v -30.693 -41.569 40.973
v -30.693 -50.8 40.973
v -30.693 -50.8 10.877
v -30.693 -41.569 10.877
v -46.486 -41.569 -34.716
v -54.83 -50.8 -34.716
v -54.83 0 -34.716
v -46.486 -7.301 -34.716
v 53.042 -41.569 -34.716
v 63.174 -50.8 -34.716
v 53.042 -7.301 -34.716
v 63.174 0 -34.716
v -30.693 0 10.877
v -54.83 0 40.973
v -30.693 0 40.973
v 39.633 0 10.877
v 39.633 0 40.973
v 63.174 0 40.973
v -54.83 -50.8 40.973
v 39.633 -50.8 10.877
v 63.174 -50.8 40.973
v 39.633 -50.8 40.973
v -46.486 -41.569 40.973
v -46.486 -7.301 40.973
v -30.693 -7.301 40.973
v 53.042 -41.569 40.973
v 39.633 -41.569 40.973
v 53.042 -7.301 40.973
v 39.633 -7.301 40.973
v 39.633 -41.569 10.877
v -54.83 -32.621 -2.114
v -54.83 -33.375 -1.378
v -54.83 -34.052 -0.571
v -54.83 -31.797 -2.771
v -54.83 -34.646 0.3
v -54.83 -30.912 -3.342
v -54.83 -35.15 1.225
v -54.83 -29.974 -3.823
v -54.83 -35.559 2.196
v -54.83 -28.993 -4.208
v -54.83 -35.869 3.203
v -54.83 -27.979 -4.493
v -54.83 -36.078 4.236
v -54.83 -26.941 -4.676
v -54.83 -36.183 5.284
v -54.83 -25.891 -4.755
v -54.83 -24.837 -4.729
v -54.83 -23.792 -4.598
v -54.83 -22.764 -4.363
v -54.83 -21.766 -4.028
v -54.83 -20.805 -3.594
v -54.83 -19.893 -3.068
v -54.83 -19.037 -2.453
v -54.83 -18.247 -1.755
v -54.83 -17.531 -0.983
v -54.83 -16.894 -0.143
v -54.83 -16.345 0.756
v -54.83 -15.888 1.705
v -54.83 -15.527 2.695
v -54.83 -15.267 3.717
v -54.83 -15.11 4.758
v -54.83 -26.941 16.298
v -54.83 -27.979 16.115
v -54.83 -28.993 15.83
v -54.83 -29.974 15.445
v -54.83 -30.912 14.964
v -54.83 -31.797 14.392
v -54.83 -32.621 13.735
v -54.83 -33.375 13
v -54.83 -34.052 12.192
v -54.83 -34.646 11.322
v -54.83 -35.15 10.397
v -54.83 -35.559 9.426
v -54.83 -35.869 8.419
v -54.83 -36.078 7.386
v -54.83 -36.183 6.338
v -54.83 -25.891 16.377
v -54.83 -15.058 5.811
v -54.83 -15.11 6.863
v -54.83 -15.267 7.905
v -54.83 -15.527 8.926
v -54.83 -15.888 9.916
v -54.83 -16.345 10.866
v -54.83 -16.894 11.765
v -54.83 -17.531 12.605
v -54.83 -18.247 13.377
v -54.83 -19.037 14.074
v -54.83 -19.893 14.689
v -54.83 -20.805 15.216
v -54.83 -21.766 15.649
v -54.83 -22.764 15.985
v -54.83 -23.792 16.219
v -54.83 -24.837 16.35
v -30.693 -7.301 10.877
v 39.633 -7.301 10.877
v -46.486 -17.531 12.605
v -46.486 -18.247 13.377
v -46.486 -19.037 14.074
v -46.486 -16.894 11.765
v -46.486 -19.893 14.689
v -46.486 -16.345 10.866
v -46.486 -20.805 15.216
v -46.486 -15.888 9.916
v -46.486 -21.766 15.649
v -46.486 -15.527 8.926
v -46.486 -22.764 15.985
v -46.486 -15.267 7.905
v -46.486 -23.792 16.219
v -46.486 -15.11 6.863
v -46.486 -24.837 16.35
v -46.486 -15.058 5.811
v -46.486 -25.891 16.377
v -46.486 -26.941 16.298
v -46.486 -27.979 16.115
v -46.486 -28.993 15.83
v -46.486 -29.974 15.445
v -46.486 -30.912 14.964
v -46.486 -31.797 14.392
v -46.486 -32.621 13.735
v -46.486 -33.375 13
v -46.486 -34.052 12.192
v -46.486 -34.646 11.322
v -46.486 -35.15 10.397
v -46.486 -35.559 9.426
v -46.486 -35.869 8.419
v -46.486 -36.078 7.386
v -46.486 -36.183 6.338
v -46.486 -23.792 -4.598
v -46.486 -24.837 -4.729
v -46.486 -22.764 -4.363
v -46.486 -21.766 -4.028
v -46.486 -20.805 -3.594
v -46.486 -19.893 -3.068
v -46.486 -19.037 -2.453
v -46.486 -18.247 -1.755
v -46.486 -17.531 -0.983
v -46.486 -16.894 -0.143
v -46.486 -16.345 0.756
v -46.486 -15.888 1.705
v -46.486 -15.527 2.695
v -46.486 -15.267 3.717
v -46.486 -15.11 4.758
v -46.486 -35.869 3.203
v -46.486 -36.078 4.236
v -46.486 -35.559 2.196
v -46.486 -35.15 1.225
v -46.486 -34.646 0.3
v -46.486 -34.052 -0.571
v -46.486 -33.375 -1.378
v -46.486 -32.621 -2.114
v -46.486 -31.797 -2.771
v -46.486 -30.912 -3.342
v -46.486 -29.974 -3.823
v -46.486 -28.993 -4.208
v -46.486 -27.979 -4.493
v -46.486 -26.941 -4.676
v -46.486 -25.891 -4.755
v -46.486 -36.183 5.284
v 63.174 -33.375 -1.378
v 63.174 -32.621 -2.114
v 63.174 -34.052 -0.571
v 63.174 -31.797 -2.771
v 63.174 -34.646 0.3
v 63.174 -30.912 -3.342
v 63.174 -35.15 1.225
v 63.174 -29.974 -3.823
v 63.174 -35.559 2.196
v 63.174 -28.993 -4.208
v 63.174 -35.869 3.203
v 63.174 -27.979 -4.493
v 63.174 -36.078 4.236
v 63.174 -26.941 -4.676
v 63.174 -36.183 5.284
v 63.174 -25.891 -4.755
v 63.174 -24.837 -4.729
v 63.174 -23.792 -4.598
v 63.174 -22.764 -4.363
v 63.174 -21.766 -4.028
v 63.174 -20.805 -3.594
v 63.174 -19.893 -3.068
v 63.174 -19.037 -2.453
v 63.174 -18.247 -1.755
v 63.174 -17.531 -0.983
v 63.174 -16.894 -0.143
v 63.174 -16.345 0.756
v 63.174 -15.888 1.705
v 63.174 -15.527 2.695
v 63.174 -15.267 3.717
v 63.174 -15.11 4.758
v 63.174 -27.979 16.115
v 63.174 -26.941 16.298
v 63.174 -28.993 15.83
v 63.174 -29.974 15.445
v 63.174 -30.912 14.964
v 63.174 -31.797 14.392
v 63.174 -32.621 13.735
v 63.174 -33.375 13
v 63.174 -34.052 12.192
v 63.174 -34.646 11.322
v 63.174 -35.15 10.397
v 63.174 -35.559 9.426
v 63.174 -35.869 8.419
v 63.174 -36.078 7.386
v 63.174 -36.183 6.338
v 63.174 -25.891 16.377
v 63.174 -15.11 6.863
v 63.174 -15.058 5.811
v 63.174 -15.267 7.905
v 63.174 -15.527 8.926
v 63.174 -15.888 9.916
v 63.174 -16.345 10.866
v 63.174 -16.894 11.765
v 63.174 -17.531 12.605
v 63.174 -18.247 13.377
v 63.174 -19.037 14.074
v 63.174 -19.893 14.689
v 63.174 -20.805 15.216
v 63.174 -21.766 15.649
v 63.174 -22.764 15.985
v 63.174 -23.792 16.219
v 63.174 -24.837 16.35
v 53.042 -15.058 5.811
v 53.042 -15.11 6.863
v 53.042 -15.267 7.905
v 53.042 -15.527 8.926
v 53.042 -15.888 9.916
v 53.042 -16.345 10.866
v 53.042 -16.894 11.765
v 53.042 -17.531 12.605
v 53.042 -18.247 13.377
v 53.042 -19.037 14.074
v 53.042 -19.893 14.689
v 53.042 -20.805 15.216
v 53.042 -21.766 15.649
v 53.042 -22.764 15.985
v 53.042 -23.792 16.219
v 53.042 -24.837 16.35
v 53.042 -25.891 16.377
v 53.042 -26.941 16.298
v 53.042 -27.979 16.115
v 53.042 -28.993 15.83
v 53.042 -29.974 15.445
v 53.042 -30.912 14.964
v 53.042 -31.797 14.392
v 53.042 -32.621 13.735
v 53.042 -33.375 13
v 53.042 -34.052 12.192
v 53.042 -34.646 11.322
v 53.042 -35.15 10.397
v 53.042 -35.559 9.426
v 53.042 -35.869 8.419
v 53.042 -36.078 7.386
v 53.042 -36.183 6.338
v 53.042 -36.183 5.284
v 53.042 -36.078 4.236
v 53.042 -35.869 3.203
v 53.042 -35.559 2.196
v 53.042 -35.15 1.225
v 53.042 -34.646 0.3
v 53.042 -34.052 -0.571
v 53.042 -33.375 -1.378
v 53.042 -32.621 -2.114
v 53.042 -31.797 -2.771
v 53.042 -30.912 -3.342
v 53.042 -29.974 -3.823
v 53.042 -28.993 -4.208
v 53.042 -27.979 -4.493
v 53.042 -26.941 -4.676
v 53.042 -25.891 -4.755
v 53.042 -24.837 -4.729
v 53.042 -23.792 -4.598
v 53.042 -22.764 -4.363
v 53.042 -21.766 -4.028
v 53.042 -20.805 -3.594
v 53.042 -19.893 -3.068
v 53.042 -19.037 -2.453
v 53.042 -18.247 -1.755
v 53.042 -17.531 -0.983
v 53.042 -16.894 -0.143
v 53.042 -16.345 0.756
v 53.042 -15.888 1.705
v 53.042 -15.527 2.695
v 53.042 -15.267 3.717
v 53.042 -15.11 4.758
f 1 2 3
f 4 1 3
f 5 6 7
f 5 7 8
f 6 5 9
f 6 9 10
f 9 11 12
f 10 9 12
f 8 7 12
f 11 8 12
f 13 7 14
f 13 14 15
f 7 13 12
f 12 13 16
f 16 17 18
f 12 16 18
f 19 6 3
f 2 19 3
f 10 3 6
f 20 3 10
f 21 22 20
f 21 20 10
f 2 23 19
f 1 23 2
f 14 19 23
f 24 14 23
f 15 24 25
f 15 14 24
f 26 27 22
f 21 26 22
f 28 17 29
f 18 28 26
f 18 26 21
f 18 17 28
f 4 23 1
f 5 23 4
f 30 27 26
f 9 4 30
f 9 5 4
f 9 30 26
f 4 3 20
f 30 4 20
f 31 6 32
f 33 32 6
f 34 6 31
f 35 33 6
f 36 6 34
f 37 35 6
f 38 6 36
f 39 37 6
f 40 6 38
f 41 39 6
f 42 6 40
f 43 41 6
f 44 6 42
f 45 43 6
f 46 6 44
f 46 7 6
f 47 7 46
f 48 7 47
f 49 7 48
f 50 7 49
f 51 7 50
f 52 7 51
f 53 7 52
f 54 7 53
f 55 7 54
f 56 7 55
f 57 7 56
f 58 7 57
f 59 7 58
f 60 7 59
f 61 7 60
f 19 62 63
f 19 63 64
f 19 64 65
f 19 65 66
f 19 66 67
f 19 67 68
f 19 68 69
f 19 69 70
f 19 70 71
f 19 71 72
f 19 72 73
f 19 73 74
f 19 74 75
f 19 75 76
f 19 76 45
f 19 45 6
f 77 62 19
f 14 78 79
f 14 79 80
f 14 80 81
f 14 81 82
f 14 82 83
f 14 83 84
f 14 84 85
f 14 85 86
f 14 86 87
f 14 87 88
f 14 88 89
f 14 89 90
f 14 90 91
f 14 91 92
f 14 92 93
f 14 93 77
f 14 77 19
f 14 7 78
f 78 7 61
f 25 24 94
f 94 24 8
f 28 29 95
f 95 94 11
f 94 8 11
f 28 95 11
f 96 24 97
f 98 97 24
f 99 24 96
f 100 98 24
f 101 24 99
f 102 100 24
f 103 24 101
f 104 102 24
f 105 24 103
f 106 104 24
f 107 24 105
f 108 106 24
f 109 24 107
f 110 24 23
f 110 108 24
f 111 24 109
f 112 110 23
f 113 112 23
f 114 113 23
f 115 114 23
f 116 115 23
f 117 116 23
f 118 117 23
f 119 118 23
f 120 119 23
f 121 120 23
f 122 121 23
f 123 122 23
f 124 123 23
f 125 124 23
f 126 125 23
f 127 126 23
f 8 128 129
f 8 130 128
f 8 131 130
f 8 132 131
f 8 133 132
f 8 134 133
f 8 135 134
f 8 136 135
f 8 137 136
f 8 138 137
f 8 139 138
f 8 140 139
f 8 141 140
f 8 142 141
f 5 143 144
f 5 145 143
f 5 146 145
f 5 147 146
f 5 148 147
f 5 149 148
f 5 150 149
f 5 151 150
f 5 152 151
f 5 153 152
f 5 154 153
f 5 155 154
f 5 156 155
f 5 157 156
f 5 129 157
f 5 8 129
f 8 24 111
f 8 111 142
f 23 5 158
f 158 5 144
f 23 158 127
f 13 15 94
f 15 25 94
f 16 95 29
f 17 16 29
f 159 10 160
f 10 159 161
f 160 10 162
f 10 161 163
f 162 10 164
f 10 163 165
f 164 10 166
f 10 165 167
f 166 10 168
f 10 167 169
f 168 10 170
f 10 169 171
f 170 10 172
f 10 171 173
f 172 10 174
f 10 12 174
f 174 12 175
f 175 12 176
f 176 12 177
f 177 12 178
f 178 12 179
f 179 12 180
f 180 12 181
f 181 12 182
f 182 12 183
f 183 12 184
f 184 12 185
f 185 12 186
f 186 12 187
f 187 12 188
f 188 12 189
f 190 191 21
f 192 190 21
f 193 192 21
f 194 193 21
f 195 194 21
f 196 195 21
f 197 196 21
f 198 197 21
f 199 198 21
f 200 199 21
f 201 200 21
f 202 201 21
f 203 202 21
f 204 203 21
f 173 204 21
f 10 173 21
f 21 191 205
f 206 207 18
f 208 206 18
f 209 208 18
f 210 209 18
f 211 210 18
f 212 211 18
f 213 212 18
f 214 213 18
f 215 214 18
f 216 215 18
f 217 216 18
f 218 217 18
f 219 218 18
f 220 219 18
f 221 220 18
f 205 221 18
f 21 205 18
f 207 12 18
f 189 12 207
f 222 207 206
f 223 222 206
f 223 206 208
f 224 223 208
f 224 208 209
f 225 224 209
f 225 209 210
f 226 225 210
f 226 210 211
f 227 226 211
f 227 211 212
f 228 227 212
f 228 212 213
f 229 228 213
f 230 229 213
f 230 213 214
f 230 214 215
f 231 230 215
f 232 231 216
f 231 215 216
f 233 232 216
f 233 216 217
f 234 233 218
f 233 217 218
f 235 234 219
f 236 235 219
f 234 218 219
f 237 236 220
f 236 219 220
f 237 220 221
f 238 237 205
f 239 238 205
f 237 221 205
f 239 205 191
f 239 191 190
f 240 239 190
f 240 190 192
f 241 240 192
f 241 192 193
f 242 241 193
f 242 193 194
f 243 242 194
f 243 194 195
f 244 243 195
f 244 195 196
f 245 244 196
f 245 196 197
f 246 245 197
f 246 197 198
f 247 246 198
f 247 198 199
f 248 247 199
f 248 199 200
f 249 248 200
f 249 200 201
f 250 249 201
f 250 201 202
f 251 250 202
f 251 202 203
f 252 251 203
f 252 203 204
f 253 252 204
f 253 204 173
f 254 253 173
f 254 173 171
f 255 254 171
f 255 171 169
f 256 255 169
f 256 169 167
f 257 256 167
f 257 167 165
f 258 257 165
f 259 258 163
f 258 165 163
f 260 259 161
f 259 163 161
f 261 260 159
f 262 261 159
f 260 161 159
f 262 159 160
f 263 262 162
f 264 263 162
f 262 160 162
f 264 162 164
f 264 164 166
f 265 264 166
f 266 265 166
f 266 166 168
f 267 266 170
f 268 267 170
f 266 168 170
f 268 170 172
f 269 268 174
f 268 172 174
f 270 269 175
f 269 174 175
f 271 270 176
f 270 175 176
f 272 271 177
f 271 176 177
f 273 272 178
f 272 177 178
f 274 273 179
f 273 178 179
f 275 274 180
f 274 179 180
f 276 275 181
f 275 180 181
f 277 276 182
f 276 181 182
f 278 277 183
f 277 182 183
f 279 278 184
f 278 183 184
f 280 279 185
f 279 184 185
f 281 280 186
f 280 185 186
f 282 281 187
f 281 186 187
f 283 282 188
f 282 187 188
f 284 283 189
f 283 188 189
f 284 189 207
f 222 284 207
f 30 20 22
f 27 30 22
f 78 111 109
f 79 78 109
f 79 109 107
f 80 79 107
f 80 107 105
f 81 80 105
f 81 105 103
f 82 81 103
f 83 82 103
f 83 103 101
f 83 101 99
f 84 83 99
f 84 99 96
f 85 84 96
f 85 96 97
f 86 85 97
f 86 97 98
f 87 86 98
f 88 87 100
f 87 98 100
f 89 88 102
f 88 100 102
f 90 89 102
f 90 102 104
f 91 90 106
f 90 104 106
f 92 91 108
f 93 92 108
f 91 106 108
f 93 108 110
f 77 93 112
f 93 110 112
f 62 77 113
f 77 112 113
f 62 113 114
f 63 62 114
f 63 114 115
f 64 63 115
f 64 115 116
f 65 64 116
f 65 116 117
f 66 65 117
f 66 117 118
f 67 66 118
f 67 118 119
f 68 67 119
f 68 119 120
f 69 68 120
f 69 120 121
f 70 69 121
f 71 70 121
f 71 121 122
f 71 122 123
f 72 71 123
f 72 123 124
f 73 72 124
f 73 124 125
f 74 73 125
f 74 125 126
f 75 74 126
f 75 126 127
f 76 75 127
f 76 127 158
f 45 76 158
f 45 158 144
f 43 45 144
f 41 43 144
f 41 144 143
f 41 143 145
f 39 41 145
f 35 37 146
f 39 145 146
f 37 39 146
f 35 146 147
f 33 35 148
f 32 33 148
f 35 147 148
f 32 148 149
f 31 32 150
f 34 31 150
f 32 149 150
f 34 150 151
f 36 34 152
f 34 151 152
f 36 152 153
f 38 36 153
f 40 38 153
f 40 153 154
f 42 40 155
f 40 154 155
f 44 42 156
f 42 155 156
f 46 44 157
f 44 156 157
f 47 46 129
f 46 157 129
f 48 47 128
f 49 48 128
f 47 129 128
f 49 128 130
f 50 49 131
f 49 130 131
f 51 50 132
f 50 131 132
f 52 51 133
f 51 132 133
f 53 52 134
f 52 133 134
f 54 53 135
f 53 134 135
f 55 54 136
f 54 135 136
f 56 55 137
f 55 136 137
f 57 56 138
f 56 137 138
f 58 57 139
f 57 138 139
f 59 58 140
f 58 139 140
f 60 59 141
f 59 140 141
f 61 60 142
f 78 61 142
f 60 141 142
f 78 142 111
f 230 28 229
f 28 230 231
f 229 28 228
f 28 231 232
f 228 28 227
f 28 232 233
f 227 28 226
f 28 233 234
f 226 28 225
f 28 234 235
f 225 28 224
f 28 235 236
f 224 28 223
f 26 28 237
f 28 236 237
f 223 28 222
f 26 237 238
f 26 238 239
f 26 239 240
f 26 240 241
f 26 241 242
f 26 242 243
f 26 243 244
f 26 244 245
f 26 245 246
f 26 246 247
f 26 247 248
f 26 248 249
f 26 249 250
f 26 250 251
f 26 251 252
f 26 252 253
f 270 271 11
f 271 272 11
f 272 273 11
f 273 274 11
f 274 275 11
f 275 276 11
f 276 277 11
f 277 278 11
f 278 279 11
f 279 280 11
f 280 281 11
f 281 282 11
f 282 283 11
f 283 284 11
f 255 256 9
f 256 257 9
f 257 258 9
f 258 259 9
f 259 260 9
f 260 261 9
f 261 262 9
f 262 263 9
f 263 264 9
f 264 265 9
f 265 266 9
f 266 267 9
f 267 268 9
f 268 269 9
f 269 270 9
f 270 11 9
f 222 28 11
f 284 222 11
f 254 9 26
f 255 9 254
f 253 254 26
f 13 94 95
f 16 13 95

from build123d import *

# Parameters (mm, degrees)
F0_W     = 118.0035807192
F0_H     = 75.6891593337
F1_DEPTH = 50.8
F2_W     = 99.5282679796
F2_H     = 34.2687154189
F3_DEPTH = 75.6901593337
F4_W     = 70.3253671527
F4_H     = 30.096870847
F4_H_2   = 7.7477134764
F5_DEPTH = 50.801
F6_R     = 10.5691557052
F7_DEPTH = 118.0045807192


with BuildPart() as f1:
    # F0 (on Front) → F1 (new body)
    with BuildSketch(Plane.XZ):
        with Locations((4.1718464345, 3.1288824975)):
            Rectangle(F0_W, F0_H)
    extrude(amount=F1_DEPTH)

    # F2 (on face) → F3 (cut, through all)
    with BuildSketch(Plane(origin=(0, 0, -34.7156971693), x_dir=(1, 0, 0), z_dir=(0, 0, -1))):
        with Locations((3.277875483, 24.4350838475)):
            Rectangle(F2_W, F2_H)
    extrude(amount=-F3_DEPTH, mode=Mode.SUBTRACT)

    # F4 (on face) → F5 (cut, through all)
    with BuildSketch(Plane.XZ.offset(50.8)):
        with Locations((4.4698342681, 25.9250267409)):
            Rectangle(F4_W, F4_H)
        with Locations((4.4698342681, 44.8473189026)):
            Rectangle(F4_W, F4_H_2)
    extrude(amount=-F5_DEPTH, mode=Mode.SUBTRACT)

    # F6 (on face) → F7 (cut, through all)
    with BuildSketch(Plane.YZ.offset(63.1736367941)):
        with Locations((-25.6270393729, 5.8107818477)):
            Circle(F6_R)
    extrude(amount=-F7_DEPTH, mode=Mode.SUBTRACT)


solid = f1.part
